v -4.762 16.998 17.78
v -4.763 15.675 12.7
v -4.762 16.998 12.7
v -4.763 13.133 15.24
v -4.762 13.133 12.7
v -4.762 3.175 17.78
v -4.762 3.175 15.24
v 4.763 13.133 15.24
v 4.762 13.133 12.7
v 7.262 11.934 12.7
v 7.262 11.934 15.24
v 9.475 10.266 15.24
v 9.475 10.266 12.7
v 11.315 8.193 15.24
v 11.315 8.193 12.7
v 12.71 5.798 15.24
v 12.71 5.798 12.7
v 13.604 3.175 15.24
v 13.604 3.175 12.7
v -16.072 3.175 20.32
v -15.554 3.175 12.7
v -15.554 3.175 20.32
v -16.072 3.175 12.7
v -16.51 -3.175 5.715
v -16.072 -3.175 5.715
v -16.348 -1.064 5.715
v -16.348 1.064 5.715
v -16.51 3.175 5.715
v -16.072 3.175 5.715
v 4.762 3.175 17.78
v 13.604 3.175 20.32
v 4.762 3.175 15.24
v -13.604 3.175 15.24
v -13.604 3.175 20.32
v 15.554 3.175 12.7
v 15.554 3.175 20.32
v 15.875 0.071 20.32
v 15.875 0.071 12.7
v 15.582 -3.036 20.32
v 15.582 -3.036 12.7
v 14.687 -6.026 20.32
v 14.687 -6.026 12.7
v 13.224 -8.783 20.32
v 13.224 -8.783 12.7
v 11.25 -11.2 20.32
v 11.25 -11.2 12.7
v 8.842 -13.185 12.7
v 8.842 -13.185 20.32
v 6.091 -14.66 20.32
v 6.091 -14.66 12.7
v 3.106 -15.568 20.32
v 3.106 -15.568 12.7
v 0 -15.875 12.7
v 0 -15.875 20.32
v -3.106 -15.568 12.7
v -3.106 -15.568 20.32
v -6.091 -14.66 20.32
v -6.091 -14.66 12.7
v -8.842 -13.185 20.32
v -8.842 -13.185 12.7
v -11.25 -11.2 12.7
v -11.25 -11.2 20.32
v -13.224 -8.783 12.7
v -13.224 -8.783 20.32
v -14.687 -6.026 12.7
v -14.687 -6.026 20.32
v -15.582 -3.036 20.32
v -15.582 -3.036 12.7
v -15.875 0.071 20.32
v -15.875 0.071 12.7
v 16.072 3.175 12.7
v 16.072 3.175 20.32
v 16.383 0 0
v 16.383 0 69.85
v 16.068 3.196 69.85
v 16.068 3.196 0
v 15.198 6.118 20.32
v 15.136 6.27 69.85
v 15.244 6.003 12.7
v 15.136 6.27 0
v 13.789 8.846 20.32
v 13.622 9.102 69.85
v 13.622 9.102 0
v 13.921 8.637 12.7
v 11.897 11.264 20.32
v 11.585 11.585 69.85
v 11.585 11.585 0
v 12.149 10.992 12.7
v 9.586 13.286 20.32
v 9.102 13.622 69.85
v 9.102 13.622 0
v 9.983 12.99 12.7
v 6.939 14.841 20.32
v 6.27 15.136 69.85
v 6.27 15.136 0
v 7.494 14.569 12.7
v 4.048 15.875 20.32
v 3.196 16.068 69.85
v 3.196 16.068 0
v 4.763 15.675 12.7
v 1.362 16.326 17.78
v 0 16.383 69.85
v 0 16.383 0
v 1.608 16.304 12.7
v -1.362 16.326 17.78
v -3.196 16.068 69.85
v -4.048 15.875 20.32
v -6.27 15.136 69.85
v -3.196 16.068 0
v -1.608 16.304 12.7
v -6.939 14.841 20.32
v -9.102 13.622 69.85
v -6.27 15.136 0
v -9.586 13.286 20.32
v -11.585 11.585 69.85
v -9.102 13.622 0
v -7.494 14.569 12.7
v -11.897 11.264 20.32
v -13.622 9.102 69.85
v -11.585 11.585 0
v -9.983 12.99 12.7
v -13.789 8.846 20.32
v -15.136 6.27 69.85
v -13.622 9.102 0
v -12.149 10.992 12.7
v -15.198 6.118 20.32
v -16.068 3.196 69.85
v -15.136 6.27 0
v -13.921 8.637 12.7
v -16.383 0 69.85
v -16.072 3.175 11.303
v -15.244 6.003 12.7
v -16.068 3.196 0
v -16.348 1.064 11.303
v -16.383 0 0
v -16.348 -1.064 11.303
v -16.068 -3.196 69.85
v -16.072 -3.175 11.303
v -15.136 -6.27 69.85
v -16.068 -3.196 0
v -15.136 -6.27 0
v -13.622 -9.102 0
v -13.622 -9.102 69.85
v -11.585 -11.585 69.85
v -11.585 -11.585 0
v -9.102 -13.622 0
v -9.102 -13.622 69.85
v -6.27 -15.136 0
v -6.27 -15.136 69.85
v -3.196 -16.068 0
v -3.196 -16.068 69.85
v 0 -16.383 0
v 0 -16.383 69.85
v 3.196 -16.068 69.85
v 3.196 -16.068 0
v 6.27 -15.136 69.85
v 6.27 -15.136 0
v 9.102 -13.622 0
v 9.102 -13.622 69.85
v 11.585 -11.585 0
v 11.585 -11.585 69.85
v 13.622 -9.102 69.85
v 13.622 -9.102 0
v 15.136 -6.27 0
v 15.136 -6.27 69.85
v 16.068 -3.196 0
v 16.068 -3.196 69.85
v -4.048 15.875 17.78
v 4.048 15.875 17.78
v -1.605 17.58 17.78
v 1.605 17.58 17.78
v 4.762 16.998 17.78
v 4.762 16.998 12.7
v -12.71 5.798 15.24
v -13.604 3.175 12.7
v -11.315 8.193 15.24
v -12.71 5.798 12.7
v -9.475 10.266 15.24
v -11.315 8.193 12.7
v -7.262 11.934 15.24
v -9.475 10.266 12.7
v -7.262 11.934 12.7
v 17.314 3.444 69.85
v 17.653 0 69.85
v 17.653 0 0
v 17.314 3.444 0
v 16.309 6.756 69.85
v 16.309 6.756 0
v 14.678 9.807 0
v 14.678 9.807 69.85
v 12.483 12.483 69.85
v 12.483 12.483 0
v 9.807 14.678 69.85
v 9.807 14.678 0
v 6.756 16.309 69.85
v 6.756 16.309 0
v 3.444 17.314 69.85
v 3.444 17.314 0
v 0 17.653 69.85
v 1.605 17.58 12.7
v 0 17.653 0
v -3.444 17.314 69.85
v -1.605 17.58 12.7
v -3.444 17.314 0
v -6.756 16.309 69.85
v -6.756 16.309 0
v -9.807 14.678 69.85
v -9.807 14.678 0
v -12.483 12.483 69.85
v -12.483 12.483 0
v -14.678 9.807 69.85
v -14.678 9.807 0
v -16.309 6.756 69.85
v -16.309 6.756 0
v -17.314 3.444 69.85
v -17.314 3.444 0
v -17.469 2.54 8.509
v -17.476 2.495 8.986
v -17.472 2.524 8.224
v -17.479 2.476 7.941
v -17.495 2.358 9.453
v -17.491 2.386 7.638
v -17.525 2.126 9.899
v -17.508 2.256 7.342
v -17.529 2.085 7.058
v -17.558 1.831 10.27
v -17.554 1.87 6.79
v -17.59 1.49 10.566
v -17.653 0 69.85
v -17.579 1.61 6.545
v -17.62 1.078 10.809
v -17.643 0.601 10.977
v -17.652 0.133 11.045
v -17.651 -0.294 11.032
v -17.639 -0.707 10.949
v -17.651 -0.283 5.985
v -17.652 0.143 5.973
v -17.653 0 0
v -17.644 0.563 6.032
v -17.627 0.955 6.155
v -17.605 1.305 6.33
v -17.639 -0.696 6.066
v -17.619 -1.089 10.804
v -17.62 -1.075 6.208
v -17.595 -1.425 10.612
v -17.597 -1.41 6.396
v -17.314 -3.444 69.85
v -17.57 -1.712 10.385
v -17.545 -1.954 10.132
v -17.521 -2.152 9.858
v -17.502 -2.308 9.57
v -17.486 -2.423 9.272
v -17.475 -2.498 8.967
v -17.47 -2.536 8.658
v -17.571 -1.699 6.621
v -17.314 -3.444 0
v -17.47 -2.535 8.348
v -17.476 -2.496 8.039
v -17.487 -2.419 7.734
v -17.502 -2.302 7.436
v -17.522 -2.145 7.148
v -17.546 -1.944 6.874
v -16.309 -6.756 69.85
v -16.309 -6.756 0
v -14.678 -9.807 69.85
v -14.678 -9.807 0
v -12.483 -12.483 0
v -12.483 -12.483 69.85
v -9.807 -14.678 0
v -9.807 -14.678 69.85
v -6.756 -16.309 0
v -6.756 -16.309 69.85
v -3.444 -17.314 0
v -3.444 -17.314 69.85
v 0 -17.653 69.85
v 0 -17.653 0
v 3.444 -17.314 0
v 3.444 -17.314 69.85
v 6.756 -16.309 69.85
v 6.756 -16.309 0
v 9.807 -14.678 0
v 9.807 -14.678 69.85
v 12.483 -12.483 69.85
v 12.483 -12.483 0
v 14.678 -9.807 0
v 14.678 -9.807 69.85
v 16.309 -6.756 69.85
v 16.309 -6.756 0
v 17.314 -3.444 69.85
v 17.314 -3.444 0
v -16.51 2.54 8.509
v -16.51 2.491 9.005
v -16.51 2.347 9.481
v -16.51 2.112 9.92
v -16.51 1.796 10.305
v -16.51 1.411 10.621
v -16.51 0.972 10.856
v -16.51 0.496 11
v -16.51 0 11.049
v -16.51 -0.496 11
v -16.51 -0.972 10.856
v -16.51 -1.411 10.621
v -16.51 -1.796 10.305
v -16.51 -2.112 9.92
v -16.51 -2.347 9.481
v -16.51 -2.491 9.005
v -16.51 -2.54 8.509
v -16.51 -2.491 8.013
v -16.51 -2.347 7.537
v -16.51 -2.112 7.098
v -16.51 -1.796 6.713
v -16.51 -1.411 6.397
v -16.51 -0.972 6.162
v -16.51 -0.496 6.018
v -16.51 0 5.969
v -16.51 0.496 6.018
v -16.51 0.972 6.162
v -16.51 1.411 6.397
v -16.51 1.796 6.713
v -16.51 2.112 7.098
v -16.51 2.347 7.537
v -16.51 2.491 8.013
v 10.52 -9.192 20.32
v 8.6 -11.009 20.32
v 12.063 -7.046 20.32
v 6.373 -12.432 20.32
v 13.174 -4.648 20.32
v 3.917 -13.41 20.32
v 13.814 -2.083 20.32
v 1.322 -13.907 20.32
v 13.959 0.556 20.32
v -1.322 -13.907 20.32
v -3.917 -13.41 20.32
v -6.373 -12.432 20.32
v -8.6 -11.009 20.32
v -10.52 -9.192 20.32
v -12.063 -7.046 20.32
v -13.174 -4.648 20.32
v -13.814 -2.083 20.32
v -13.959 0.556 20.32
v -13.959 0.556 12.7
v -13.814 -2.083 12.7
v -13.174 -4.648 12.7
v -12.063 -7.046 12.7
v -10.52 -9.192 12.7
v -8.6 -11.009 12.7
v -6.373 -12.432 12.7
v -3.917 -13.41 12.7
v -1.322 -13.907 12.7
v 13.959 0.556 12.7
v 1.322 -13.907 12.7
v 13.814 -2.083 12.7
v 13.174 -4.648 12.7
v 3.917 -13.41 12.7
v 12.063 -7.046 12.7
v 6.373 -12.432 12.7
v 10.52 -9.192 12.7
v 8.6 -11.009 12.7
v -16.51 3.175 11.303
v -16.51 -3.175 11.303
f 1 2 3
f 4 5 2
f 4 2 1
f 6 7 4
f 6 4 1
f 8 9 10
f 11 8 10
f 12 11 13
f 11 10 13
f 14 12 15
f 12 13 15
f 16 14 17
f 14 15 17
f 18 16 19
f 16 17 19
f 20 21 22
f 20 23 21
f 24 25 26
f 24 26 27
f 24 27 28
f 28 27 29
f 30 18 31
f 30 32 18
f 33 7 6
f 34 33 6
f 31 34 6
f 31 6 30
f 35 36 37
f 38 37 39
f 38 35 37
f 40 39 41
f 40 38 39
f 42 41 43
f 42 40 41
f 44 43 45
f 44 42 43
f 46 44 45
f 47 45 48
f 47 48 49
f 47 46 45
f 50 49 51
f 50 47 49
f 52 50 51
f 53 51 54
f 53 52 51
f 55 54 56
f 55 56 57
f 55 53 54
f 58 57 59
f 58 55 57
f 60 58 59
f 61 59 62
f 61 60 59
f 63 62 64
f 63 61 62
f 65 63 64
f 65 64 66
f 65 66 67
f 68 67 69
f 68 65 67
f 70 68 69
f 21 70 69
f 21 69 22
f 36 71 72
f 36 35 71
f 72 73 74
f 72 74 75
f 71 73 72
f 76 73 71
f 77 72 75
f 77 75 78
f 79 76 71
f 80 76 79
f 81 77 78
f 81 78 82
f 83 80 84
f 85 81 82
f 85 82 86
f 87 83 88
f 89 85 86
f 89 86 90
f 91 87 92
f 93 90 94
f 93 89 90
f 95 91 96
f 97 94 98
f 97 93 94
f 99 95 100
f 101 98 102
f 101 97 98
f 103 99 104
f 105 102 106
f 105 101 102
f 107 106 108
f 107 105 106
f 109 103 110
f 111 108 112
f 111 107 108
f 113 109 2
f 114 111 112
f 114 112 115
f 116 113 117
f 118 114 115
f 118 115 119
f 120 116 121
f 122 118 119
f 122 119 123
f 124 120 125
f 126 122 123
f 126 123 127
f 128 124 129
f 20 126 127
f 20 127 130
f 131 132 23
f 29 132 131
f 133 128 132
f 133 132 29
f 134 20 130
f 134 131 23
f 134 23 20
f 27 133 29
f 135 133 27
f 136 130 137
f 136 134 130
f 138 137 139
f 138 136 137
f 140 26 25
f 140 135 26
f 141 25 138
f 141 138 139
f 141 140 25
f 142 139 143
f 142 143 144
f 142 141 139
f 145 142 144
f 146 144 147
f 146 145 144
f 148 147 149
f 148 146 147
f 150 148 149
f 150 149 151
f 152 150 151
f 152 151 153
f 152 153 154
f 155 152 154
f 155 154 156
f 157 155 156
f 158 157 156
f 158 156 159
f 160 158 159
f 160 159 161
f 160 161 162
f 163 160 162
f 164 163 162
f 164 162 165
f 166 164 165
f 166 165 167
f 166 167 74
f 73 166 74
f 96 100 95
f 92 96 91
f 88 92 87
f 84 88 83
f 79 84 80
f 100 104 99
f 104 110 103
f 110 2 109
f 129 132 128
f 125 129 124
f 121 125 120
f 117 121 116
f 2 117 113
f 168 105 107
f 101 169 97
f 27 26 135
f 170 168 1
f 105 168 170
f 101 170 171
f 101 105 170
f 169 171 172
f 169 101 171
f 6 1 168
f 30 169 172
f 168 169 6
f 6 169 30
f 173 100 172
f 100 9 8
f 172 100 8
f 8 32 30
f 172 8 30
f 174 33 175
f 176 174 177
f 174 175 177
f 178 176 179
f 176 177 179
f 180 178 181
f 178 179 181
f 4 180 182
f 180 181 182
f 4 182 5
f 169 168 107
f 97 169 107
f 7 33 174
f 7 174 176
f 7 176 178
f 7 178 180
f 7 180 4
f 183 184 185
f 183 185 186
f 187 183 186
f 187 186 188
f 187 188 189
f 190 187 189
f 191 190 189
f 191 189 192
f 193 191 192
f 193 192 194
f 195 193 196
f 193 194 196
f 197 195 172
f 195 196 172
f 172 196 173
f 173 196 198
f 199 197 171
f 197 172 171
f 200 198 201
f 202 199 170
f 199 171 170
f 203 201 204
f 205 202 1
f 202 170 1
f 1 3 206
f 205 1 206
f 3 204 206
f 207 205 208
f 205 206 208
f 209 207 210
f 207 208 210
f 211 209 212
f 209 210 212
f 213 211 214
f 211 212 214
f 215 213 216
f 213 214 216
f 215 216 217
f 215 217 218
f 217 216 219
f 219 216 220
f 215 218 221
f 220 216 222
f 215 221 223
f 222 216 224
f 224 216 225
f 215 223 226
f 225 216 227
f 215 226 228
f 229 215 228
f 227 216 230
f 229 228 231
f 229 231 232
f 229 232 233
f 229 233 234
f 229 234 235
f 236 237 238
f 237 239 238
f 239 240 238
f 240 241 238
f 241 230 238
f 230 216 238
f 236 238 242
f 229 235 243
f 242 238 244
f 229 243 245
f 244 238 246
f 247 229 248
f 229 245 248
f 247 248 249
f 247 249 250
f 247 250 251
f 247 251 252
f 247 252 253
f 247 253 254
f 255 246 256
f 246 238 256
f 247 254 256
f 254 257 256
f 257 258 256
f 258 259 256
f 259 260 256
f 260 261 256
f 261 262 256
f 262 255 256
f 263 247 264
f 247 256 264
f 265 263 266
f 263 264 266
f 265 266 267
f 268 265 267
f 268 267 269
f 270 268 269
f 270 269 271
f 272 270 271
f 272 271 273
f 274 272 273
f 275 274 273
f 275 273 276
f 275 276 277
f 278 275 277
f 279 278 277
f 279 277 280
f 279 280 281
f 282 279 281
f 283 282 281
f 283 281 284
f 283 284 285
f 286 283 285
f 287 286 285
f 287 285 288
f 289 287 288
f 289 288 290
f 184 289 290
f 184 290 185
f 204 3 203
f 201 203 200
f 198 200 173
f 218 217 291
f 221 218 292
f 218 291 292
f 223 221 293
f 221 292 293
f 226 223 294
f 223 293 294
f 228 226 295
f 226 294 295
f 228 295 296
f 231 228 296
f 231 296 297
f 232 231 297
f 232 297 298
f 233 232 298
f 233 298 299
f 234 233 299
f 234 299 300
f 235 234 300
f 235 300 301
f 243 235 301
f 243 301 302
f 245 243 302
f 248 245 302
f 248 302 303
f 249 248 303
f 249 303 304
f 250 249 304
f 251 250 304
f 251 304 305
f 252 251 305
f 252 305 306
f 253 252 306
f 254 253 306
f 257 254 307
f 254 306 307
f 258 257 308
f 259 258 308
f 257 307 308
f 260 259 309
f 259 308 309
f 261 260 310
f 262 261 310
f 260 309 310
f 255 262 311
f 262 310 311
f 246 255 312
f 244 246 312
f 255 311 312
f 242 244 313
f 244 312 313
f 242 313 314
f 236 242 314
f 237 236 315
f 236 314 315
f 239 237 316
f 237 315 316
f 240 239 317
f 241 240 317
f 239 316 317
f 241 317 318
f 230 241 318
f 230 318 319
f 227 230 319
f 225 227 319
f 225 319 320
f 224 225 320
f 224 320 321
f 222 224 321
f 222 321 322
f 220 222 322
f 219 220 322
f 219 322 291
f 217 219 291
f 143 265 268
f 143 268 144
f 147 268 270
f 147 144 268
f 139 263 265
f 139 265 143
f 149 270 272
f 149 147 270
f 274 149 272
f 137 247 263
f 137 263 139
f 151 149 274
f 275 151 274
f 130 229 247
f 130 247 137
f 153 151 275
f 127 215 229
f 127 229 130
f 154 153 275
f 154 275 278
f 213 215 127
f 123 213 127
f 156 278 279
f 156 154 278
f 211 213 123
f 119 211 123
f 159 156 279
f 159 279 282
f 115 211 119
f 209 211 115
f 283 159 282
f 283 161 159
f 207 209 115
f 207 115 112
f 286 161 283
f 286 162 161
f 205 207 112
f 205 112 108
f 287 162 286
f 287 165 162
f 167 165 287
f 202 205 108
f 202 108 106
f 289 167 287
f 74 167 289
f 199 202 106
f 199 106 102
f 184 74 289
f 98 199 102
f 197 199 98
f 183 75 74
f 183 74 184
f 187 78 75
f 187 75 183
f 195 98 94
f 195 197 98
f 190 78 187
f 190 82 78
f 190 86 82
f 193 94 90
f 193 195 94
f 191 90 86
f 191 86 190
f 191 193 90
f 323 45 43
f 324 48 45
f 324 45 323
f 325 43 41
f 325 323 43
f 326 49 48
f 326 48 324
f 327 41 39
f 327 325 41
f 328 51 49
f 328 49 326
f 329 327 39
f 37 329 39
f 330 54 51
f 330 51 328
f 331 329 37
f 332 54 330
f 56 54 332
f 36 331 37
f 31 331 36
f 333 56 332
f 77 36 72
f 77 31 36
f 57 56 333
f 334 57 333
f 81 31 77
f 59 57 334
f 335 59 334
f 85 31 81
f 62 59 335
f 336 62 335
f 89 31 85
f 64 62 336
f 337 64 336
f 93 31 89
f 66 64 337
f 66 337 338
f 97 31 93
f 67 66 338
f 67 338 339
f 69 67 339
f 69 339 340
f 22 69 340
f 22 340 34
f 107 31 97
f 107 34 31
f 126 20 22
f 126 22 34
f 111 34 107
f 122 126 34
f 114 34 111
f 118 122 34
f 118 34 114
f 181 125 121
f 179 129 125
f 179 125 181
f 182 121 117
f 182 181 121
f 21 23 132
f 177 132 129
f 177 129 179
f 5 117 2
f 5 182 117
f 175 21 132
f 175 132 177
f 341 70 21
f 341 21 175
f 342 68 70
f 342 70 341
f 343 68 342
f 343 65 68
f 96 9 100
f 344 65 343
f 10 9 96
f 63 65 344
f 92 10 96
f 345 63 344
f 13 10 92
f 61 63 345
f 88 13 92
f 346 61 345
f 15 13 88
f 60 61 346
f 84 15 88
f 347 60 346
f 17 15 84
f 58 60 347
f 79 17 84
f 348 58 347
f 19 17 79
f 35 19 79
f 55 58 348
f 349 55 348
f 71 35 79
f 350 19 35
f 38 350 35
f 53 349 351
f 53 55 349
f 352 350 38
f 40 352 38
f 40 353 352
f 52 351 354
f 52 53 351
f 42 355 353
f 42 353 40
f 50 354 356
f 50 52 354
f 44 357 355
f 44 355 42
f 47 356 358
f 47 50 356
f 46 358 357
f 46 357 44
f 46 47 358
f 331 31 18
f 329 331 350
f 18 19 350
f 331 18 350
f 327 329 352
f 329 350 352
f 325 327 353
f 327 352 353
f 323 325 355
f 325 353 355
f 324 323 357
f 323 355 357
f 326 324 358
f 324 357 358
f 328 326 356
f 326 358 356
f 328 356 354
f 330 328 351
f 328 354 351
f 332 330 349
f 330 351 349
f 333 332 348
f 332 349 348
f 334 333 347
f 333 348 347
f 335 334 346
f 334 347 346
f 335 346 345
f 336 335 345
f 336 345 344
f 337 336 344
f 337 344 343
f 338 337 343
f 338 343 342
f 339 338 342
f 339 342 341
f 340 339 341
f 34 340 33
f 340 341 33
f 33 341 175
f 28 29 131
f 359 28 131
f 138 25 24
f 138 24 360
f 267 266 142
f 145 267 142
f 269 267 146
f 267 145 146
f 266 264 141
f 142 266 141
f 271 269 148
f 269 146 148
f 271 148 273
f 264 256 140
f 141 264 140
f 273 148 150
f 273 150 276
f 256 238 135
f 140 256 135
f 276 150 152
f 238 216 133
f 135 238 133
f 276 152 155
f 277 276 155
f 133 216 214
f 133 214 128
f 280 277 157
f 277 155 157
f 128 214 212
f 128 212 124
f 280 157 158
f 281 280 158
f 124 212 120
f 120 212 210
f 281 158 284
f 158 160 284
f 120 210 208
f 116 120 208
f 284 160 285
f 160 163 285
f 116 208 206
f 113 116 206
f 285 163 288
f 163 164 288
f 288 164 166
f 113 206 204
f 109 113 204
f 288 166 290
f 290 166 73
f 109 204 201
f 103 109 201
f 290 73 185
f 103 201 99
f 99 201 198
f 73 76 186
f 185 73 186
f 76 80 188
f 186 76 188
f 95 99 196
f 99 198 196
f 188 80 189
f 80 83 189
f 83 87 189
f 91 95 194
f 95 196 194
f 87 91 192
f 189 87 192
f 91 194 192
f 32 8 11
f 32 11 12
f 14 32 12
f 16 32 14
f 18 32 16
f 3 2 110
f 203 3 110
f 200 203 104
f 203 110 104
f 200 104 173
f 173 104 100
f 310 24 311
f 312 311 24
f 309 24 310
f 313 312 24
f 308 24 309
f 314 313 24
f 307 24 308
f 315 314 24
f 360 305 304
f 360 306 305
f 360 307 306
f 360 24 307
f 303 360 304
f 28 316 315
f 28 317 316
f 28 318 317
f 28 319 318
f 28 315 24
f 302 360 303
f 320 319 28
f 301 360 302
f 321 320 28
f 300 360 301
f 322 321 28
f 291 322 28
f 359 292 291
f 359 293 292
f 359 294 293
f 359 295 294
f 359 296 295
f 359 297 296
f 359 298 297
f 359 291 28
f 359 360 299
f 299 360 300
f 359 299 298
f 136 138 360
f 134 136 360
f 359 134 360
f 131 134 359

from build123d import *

# Parameters (mm, degrees)
F0_R      = 17.653
F0_R_2    = 16.383
F1_DEPTH  = 69.85
F2_W      = 12.7
F2_H      = 7.62
F6_R      = 2.54
F7_DEPTH  = 25.4
F8_R      = 15.875
F8_R_2    = 13.97
F9_DEPTH  = 2.54
F10_DEPTH = 7.62
F11_DEPTH = 2.54
F3_W      = 9.525
F3_H      = 5.08
F12_DEPTH = 25.4
F13_W     = 6.35
F13_H     = 5.588
F14_DEPTH = 16.51


with BuildPart() as f1:
    # F0 (on Top) → F1 (new body)
    with BuildSketch(Plane.XY):
        Circle(F0_R)
        Circle(F0_R_2, mode=Mode.SUBTRACT)
    extrude(amount=F1_DEPTH)

    # F2 (on Right) → F4 (join, up to the next surface of F1)
    with BuildSketch(Plane.YZ):
        with Locations((9.525, 16.51)):
            Rectangle(F2_W, F2_H)
    extrude(until=Until.NEXT, dir=(-1, 0, 0))

    # F2 (on Right) → F5 (join, up to the next surface of F1)
    with BuildSketch(Plane.YZ):
        with Locations((9.525, 16.51)):
            Rectangle(F2_W, F2_H)
    extrude(until=Until.NEXT)

    # F6 (on Right) → F7 (cut)
    with BuildSketch(Plane.YZ):
        with Locations((0, 8.509)):
            Circle(F6_R)
    extrude(amount=-F7_DEPTH, mode=Mode.SUBTRACT)

    # F8 (on face) → F9 (join)
    with BuildSketch(Plane(origin=(0, 0, 12.7), x_dir=(1, 0, 0), z_dir=(0, 0, -1))):
        Circle(F8_R)
        Circle(F8_R_2, mode=Mode.SUBTRACT)
    extrude(amount=-F9_DEPTH)

    # F8 (on face) → F10 (join)
    with BuildSketch(Plane(origin=(0, 0, 12.7), x_dir=(1, 0, 0), z_dir=(0, 0, -1))):
        Circle(F8_R)
        Circle(F8_R_2, mode=Mode.SUBTRACT)
    extrude(amount=-F10_DEPTH)

    # F8 (on face) → F11 (cut)
    with BuildSketch(Plane(origin=(0, 0, 12.7), x_dir=(1, 0, 0), z_dir=(0, 0, -1))):
        with BuildLine():
            Line((13.6044211564, -3.175), (-13.6044211564, -3.175))
            ThreePointArc((-13.6044211564, -3.175), (0, -13.97), (13.6044211564, -3.175))
        make_face()
    extrude(amount=-F11_DEPTH, mode=Mode.SUBTRACT)

    # F3 (on Front) → F12 (cut)
    with BuildSketch(Plane.XZ):
        with Locations((0, 15.24)):
            Rectangle(F3_W, F3_H)
    extrude(amount=-F12_DEPTH, mode=Mode.SUBTRACT)

    # F13 (on Right) → F14 (cut)
    with BuildSketch(Plane.YZ):
        with Locations((0, 8.509)):
            Rectangle(F13_W, F13_H)
    extrude(amount=-F14_DEPTH, mode=Mode.SUBTRACT)


solid = f1.part
